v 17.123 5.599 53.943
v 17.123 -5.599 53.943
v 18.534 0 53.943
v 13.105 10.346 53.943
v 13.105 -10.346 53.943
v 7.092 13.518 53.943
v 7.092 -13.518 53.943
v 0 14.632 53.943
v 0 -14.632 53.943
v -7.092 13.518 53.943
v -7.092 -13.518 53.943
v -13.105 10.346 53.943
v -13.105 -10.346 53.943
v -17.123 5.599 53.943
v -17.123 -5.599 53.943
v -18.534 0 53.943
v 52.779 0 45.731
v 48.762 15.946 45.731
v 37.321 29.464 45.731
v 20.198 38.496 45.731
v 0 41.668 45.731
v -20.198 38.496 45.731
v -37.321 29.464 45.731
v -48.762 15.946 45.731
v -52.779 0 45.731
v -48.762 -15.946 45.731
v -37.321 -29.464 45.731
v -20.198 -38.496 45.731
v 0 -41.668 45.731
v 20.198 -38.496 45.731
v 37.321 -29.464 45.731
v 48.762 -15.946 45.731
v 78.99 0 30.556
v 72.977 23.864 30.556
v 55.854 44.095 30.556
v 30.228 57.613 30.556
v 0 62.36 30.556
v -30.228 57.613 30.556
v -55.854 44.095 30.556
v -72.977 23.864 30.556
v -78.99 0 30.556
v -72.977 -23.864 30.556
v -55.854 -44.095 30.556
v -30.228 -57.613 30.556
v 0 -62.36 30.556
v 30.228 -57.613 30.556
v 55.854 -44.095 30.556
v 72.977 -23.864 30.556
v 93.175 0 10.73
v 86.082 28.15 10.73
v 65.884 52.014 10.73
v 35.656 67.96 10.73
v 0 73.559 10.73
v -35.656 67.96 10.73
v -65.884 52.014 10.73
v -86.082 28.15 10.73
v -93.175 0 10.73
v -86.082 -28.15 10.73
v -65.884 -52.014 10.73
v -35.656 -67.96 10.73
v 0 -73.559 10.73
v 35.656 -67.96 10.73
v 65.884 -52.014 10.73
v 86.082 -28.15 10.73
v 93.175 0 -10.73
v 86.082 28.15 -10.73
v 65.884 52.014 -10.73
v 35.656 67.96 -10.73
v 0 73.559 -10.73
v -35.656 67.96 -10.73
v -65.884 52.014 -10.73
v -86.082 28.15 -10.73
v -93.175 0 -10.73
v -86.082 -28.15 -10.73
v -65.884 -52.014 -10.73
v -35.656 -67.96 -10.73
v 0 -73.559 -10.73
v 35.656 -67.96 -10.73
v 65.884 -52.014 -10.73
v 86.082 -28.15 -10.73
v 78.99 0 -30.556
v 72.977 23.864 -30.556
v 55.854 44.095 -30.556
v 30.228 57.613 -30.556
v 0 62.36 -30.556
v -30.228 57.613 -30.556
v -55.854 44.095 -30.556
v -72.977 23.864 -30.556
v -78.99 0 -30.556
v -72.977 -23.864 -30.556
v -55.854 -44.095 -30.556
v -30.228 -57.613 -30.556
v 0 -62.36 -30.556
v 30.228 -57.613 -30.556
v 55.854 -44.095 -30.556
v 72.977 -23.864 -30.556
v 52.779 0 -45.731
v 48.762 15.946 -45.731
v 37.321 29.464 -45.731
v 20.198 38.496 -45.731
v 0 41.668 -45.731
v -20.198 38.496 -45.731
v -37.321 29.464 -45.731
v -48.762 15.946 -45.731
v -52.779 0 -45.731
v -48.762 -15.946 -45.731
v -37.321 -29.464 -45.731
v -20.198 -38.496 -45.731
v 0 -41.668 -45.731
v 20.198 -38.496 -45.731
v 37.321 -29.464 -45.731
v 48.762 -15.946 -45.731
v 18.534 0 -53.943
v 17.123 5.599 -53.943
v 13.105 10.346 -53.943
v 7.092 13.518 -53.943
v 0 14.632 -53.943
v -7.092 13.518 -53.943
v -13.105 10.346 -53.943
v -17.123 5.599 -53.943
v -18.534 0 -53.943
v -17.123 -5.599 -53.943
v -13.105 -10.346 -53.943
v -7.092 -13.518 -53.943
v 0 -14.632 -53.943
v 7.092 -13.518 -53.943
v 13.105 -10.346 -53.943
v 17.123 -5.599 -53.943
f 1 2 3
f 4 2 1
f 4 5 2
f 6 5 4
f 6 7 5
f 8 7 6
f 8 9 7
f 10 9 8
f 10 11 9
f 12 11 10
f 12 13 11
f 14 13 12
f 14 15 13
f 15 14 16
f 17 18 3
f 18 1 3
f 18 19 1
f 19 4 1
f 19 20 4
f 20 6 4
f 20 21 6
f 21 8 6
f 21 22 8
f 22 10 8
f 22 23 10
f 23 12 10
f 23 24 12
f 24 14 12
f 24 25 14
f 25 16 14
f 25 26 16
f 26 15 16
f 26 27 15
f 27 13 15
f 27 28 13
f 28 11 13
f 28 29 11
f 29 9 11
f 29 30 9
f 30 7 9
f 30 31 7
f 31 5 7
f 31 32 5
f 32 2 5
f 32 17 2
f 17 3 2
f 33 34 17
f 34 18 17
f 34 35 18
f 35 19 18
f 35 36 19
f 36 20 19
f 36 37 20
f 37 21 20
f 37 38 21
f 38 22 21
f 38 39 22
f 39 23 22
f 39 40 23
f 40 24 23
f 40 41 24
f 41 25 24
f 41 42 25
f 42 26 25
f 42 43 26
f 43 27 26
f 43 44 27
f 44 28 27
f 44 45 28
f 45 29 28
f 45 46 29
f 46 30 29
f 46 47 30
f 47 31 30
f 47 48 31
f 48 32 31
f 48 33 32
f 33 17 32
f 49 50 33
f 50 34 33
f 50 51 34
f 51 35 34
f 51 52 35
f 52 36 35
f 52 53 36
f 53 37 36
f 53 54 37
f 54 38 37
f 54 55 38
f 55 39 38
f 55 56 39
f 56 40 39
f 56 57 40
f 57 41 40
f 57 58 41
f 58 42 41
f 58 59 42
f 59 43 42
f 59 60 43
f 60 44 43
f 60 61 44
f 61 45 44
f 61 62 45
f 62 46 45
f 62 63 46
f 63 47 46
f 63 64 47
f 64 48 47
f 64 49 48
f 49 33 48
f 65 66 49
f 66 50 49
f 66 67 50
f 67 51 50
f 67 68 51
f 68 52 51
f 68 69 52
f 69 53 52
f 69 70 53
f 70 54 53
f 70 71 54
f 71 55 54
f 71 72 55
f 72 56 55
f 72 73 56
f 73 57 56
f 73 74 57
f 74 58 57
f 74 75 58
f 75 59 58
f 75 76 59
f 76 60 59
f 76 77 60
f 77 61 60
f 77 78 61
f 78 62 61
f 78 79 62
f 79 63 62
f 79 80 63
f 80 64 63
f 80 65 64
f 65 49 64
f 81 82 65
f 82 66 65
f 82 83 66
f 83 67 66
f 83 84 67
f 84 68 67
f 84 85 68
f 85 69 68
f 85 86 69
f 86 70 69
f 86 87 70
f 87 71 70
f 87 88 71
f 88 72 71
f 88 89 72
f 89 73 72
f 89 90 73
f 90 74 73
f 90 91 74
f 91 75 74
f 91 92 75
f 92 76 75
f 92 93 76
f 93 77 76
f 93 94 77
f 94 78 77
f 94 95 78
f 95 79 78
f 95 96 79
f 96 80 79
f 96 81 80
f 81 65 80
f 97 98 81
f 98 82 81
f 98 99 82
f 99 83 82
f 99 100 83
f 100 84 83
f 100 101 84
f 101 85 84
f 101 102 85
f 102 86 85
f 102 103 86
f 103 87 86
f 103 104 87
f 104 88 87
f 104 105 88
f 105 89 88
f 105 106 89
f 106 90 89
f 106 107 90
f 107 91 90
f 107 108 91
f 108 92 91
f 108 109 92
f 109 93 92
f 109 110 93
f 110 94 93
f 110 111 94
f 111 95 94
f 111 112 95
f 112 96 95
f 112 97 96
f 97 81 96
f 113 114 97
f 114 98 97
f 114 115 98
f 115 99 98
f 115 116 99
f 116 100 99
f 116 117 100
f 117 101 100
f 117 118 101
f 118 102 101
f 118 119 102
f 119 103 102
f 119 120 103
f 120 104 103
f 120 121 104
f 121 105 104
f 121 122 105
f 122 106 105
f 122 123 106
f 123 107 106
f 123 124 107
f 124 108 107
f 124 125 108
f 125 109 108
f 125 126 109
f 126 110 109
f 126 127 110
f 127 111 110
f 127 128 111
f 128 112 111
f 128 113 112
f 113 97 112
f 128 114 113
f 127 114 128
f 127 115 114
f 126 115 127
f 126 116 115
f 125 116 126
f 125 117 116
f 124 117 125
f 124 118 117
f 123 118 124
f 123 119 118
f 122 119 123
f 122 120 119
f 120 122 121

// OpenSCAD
// Generated by SolidPython 1.0.1 on 2020-07-29 00:46:54


scale(v = [19, 15, 11]) {
	sphere(r = 5);
}
/***********************************************
*********      SolidPython code:      **********
************************************************
 
# import packages: SolidPython
from solid import *
from solid.utils import *
from itertools import chain, combinations, permutations


class Resize:

    def __init__(self, scad_file):
        self.scad_file = scad_file
        #self.scad_file = import_scad(scad_file)
        # cone/cylinder param:
        self.r1 = 0
        self.r2 = 0
        self.h = 0
        # rectangular prism param:
        self.w = 0
        self.l = 0
        # ellipse param:
        self.r = 0

    # import OpenScad code (file name corresponds to shape)


    # classify shape + parameters
    def assign(self, param1, param2, param3):
        if self.scad_file == 'cone.scad':
            self.r1 = param1
            self.r2 = param2
            self.h = param3
        elif self.scad_file == 'cylinder.scad':
            self.r1 = param1
            self.r2 = param2
            self.h = param3
        elif self.scad_file == 'rectangularPrism.scad':
            self.h = param1
            self.l = param2
            self.w = param3
        else:
            self.r = param1
            self.h = param2

    # resize parameters
    def iterate(self):
        x = range(3, 20, 2)
        i = 1
        if self.scad_file == 'cone.scad':
            tempList = list(permutations(x, 2))
            for temp in tempList:
                param1 = temp[0]
                param2 = temp[1]
                filepath = 'produced_scad_files/' + 'cone' + str(param1) + '_' + str(param2) + '_' + '.scad'
                scad_render_to_file(cylinder(h=param1, r1=param2, r2=0), filepath)

        elif self.scad_file == 'cylinder.scad':
            tempList = list(permutations(x, 3))
            for temp in tempList:
                param1 = temp[0]
                param2 = temp[1]
                filepath = 'produced_scad_files/' + 'cylinder' + str(param1) + '_' + str(param2) + '_' + '.scad'
                scad_render_to_file(cylinder(h=param1, r1=param2, r2=param2), filepath)

        elif self.scad_file == 'rectangularPrism.scad':
            tempList = list(permutations(x, 3))
            for temp in tempList:
                param1 = temp[0]
                param2 = temp[1]
                param3 = temp[2]
                filepath = 'produced_scad_files/' + 'rectangularPrism' + str(param1) + '_' + str(param2) + '_' + str(
                    param3) + '.scad'
                scad_render_to_file(cube(size=(param1, param2, param3)), filepath)

        elif self.scad_file == 'ellipse.scad':
            tempList = list(permutations(x, 4))
            for temp in tempList:
                param1 = temp[0]
                param2 = temp[1]
                param3 = temp[2]
                param4 = temp[3]
                filepath = 'produced_scad_files/' + 'ellipse' + str(param1) + '_' + str(param2) + '_' + str(param3) + '_' + str(param4) + '.scad'
                scad_render_to_file(scale([param1, param2, param3])(sphere(r=param4)), filepath)

    def render_to_scadfile(self):
        scad_render_to_file(scad, 'example.scad') 
 
************************************************/
